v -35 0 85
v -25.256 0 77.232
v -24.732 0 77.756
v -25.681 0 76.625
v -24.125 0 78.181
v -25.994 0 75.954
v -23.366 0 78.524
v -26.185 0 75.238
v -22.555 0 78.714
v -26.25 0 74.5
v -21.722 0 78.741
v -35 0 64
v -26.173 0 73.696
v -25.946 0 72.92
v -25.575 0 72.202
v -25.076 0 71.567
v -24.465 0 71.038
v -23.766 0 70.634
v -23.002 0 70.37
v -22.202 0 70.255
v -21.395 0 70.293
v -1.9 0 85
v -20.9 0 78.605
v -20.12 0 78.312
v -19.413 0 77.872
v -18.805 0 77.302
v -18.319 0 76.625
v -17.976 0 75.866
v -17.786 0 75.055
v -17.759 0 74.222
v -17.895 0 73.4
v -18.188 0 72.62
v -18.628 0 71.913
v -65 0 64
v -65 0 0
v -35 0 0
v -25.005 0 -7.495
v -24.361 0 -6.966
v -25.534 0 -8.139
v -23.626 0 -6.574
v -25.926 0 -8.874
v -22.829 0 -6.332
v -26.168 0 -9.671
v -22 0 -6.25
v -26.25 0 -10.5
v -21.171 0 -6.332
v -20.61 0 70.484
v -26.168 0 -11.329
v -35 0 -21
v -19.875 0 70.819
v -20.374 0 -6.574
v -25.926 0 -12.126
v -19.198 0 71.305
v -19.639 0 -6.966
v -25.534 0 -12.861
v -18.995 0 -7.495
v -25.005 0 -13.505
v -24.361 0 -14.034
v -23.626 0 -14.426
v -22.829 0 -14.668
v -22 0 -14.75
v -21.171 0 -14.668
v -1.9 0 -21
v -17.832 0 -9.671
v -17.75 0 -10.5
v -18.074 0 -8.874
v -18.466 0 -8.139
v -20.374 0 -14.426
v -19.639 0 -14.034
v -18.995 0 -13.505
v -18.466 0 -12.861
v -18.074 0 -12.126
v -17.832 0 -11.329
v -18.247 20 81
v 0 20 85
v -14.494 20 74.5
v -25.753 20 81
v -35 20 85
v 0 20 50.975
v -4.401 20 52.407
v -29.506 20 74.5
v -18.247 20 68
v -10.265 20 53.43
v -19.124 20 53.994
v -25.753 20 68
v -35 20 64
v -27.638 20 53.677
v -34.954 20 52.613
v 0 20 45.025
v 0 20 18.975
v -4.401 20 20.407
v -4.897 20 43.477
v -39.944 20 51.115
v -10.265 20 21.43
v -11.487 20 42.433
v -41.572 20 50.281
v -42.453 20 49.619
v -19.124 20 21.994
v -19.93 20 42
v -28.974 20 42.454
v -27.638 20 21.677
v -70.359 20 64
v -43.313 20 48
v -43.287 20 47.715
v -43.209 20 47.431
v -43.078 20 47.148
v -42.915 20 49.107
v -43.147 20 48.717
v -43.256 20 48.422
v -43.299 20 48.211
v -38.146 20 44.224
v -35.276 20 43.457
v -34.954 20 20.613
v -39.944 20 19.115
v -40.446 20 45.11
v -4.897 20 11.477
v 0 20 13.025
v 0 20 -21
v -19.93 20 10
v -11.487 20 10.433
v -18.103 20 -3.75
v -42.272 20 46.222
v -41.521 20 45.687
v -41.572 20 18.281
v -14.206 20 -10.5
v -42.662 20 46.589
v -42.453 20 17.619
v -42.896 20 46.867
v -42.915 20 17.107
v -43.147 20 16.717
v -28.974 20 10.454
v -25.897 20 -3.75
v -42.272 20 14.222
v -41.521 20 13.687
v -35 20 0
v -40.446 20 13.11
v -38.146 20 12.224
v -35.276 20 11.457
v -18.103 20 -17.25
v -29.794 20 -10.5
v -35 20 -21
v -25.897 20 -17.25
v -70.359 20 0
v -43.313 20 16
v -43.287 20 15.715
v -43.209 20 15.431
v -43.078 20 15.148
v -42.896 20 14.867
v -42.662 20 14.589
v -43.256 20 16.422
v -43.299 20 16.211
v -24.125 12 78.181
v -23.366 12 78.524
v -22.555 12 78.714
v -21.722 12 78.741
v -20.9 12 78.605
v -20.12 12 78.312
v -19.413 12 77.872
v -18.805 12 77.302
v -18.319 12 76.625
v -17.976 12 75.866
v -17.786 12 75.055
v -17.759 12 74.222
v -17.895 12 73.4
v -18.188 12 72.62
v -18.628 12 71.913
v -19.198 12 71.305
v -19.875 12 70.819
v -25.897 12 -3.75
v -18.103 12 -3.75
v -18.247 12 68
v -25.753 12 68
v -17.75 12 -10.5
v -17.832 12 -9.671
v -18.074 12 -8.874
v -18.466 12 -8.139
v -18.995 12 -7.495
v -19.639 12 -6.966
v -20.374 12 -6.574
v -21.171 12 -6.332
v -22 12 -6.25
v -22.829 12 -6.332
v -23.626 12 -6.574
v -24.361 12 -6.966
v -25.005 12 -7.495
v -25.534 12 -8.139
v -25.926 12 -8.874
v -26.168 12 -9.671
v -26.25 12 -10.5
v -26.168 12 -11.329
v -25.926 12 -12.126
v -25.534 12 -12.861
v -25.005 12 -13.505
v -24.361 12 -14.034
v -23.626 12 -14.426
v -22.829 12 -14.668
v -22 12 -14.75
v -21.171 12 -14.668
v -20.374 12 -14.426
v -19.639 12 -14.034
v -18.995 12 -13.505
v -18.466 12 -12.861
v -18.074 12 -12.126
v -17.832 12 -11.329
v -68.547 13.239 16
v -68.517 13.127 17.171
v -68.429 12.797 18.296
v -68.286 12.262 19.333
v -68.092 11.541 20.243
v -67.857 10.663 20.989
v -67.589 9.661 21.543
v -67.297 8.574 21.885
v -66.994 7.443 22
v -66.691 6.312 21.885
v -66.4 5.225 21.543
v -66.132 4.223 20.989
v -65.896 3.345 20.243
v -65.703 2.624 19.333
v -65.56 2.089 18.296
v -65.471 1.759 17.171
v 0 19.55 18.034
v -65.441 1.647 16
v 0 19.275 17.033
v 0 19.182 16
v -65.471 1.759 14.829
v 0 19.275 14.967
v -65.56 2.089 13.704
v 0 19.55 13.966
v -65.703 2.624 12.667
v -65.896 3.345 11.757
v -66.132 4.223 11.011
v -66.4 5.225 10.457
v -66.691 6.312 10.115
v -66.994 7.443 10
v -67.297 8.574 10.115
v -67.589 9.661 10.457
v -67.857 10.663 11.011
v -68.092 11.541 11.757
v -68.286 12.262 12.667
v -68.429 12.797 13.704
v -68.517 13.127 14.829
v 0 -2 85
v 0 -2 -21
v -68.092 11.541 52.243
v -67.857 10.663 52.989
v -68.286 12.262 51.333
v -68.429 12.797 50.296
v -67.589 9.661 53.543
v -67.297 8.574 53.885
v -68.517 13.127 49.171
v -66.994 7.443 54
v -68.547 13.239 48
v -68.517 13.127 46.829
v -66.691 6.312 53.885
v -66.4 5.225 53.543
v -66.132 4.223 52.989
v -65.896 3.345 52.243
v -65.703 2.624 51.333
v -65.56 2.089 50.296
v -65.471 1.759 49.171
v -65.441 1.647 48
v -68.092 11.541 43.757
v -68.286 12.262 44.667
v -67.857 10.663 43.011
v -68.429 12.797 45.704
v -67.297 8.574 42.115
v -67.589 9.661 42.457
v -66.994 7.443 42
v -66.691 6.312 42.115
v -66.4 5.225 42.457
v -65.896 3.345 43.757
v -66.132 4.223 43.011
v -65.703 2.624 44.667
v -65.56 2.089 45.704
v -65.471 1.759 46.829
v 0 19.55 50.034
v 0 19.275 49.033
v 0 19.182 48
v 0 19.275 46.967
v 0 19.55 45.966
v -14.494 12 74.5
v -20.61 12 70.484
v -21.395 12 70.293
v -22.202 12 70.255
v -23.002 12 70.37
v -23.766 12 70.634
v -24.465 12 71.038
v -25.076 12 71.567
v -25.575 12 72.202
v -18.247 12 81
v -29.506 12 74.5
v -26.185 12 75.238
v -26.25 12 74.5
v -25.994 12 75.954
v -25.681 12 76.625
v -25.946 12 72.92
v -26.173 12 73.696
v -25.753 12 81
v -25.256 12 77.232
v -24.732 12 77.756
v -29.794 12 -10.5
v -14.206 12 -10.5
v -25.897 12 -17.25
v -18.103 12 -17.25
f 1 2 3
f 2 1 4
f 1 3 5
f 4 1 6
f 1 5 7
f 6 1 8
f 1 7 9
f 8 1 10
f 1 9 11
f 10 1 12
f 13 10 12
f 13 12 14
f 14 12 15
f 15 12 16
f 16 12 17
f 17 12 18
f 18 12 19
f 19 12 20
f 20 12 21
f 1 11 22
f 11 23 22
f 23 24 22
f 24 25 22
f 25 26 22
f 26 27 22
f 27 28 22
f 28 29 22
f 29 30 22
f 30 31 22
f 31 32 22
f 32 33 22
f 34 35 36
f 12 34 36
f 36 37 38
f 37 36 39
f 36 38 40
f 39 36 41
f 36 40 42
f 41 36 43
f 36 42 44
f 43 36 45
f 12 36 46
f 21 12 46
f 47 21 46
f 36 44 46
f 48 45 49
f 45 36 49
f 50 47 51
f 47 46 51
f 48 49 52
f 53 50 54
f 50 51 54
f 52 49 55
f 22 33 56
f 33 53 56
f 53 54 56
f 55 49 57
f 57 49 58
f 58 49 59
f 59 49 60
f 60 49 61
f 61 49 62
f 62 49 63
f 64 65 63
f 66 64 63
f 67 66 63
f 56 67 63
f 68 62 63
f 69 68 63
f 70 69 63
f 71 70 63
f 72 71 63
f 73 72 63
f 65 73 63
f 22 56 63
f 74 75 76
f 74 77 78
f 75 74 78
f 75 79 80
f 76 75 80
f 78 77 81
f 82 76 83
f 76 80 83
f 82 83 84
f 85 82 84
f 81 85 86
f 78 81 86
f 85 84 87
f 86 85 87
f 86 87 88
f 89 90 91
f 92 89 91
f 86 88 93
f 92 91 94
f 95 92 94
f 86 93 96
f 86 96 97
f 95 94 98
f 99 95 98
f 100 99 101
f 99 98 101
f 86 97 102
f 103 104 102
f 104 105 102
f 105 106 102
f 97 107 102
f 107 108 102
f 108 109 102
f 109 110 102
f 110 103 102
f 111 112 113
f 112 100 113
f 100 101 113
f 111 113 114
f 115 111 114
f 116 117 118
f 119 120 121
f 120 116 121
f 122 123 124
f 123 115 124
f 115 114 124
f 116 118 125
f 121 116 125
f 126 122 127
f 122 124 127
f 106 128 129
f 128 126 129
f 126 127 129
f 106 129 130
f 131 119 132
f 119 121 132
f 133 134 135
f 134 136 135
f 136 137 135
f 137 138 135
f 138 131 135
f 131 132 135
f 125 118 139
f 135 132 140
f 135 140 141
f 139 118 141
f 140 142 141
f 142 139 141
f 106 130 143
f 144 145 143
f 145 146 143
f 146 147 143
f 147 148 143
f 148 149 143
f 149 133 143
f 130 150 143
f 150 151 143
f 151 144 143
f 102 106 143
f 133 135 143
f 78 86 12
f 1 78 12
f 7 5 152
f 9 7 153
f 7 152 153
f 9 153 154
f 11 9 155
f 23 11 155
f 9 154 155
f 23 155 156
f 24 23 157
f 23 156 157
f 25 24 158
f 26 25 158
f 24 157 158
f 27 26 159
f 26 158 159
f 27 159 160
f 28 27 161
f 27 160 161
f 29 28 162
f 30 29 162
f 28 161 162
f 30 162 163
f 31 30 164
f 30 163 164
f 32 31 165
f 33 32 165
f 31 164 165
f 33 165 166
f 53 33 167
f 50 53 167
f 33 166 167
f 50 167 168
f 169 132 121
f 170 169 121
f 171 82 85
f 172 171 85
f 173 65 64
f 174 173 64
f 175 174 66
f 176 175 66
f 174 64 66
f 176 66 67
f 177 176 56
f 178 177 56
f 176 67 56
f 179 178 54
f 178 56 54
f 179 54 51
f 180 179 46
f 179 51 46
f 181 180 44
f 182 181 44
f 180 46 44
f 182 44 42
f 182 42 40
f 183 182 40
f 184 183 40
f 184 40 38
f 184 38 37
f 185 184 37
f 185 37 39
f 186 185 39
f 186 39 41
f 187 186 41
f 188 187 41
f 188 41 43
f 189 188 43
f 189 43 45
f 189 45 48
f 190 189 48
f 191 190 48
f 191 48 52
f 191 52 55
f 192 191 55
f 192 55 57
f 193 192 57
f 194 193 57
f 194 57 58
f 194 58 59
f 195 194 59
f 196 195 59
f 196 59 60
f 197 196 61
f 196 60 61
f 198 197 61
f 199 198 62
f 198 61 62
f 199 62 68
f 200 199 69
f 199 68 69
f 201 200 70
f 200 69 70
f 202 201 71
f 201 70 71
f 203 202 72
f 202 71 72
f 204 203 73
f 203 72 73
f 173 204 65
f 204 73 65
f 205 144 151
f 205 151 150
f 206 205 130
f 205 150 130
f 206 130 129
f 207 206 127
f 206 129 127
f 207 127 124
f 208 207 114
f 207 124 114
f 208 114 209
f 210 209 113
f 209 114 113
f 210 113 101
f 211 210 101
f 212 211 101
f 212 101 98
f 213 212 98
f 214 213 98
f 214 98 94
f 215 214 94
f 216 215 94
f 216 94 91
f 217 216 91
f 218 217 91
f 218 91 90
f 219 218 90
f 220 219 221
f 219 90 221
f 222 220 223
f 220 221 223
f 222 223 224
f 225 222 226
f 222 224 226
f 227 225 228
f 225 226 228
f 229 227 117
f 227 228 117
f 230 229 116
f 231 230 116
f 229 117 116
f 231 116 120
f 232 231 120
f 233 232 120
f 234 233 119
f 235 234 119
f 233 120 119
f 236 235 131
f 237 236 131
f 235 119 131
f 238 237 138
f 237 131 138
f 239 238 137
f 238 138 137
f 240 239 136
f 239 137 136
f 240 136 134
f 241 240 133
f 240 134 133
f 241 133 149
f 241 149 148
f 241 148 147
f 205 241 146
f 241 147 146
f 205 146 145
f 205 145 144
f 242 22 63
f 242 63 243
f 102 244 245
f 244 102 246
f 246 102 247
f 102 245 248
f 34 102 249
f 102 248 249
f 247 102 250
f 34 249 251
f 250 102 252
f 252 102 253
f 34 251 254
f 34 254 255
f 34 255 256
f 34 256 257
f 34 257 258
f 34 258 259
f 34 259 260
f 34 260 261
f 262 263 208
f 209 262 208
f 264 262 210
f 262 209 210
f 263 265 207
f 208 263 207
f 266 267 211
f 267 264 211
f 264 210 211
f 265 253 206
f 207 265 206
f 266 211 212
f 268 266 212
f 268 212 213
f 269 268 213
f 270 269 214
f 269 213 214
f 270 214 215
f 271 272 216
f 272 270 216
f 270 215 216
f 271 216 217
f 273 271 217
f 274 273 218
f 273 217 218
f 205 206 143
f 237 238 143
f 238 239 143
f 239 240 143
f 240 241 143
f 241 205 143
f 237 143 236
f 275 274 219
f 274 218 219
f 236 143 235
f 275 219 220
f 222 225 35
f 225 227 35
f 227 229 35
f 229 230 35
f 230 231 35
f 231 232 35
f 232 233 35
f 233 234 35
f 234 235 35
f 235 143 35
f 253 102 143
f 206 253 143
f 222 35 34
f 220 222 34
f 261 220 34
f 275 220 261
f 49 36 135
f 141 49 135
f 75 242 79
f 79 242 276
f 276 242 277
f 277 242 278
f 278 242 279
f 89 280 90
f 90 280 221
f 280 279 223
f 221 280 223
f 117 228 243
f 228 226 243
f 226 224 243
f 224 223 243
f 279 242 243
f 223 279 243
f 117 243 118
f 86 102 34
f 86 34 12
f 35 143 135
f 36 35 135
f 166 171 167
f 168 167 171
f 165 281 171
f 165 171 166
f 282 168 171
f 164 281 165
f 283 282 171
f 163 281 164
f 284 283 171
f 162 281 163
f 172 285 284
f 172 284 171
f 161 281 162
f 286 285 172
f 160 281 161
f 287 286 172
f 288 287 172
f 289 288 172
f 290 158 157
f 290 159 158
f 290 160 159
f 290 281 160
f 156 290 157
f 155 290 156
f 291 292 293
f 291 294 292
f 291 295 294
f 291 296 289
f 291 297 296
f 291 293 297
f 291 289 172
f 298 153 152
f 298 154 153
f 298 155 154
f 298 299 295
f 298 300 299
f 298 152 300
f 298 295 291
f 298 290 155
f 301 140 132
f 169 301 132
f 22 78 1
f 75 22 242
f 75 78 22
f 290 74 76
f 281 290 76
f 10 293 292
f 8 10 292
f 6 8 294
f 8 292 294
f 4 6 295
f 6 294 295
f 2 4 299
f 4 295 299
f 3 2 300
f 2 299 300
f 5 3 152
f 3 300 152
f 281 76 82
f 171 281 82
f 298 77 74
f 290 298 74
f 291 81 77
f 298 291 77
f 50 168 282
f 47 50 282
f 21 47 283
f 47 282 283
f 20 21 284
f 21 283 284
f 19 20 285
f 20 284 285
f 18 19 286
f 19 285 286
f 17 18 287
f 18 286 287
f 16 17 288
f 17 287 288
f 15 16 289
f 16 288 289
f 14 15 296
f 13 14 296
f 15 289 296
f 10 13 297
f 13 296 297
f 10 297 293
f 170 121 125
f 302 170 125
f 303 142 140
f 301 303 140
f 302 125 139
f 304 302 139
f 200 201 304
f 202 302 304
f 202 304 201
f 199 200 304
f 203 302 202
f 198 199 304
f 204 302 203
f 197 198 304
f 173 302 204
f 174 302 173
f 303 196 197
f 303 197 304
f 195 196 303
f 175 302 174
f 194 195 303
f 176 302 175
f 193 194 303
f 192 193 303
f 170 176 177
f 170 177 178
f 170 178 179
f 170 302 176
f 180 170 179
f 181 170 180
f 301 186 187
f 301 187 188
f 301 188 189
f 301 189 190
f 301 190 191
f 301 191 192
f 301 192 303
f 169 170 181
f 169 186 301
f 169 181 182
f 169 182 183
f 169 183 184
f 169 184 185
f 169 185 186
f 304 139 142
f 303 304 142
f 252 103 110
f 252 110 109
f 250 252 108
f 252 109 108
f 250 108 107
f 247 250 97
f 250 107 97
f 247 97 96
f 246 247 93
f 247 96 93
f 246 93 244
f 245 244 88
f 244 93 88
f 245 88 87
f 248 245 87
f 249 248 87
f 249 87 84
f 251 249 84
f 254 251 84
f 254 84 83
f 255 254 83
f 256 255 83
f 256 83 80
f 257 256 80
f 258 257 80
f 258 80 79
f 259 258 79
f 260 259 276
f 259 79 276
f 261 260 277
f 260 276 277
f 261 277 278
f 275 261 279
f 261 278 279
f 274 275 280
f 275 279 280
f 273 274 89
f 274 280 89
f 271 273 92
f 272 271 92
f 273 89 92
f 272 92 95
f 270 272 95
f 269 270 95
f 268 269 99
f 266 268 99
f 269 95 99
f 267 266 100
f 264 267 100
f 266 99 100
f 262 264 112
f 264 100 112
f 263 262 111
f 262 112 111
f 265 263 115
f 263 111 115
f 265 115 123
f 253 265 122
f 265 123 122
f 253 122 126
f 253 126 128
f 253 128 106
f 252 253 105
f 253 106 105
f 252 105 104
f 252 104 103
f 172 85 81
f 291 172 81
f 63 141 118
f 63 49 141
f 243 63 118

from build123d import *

# Parameters (mm, degrees)
F1_DEPTH  = 64
F3_D      = 12
F5_DEPTH  = 21
F7_DEPTH  = 8
F9_DEPTH  = 21
F11_DEPTH = 8
F13_DEPTH = 25
F14_D     = 8.5


with BuildPart() as f1:
    # F0 (on Top) → F1 (new body)
    with BuildSketch(Plane.XY):
        Polygon((-65, 0), (-1.9, 0), (0, -2), (0, 20), (-70.3589838486, 20), align=None)
    extrude(amount=F1_DEPTH)

    # F3 (through all)
    with Locations(Plane(origin=(-60.645825623, -16.25, 0), x_dir=(0.2588190451, -0.9659258263, 0), z_dir=(-0.9659258263, -0.2588190451, 0))):
        with Locations((-24.5287615399, 48), (-24.5287615399, 16)):
            Hole(F3_D / 2)

    # F4 (on face) → F5 (join)
    with BuildSketch(Plane(origin=(0, 0, 0), x_dir=(1, 0, 0), z_dir=(0, 0, -1))):
        Polygon((-35, -20), (0, -20), (0, 0), (-1.9, 0), (-35, 0), align=None)
        Polygon((-1.9, 0), (0, 0), (0, 2), align=None)
    extrude(amount=F5_DEPTH)

    # F6 (on face) → F7 (cut)
    with BuildSketch(Plane(origin=(0, 20, 0), x_dir=(-1, 0, 0), z_dir=(0, 1, 0))):
        Polygon((25.897114317, -17.25), (29.7942286341, -10.5), (22, -10.5), (22, -17.25), align=None)
        Polygon((22, -10.5), (29.7942286341, -10.5), (25.897114317, -3.75), (18.102885683, -3.75), (14.2057713659, -10.5), align=None)
        Polygon((22, -17.25), (22, -10.5), (14.2057713659, -10.5), (18.102885683, -17.25), align=None)
    extrude(amount=-F7_DEPTH, mode=Mode.SUBTRACT)

    # F8 (on face) → F9 (join)
    with BuildSketch(Plane.XY.offset(64)):
        Polygon((0, 0), (0, 20), (-35, 20), (-35, 0), (-1.9, 0), align=None)
        Polygon((0, -2), (0, 0), (-1.9, 0), align=None)
    extrude(amount=F9_DEPTH)

    # F10 (on face) → F11 (cut)
    with BuildSketch(Plane(origin=(0, 20, 0), x_dir=(-1, 0, 0), z_dir=(0, 1, 0))):
        Polygon((25.7527767497, 68), (29.5055534995, 74.5), (14.4944465005, 74.5), (18.2472232503, 68), align=None)
        Polygon((14.4944465005, 74.5), (29.5055534995, 74.5), (25.7527767497, 81), (18.2472232503, 81), align=None)
    extrude(amount=-F11_DEPTH, mode=Mode.SUBTRACT)

    # F12 (on face) → F13 (cut)
    with BuildSketch(Plane(origin=(0, 12, 0), x_dir=(-1, 0, 0), z_dir=(0, 1, 0))):
        with BuildLine():
            Line((19.875, 70.8193920339), (24.125, 78.1806079661))
            ThreePointArc((24.125, 78.1806079661), (18.3193920339, 76.625), (19.875, 70.8193920339))
        make_face()
        with BuildLine():
            ThreePointArc((26.25, 74.5), (25.6806079661, 76.625), (24.125, 78.1806079661))
            Line((24.125, 78.1806079661), (19.875, 70.8193920339))
            ThreePointArc((19.875, 70.8193920339), (24.125, 70.8193920339), (26.25, 74.5))
        make_face()
    extrude(amount=-F13_DEPTH, mode=Mode.SUBTRACT)

    # F14 (through all)
    with Locations(Plane(origin=(0, 20, 0), x_dir=(-1, 0, 0), z_dir=(0, 1, 0))):
        with Locations((22, -10.5)):
            Hole(F14_D / 2)


solid = f1.part
